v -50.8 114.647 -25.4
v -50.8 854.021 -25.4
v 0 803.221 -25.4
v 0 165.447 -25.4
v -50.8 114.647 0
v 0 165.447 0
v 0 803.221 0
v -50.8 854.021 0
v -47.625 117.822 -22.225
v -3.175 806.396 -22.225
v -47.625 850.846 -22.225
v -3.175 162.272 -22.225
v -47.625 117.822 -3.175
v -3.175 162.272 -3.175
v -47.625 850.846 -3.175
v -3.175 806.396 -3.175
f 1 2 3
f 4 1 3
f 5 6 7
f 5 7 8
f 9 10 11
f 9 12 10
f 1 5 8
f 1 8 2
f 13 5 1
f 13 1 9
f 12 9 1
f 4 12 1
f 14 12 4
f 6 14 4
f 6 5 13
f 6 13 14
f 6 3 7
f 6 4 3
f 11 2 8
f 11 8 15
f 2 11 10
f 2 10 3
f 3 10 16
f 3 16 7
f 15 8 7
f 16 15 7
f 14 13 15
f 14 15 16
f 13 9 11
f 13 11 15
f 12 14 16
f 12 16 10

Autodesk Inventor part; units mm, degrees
ref_plane "YZ Plane" through (0, 0, 0) normal (1, 0, 0) x (0, 1, 0)
ref_plane "XZ Plane" through (0, 0, 0) normal (0, 1, 0) x (-1, 0, 0)
ref_plane "XY Plane" through (0, 0, 0) normal (0, 0, 1) x (1, 0, 0)
sketch "Sketch1" plane through (0, 0, 0) normal (0, 1, 0) x (-1, 0, 0)
  line L0 (0, 0) -> (50.8, 0)
  line L1 (50.8, 0) -> (50.8, -25.4)
  line L2 (50.8, -25.4) -> (0, -25.4)
  line L3 (0, -25.4) -> (0, 0)
  line L4 (47.625, -22.225) -> (47.625, -3.175)
  line L5 (47.625, -3.175) -> (3.175, -3.175)
  line L6 (3.175, -3.175) -> (3.175, -22.225)
  line L7 (3.175, -22.225) -> (47.625, -22.225)
  dimension "d0" = 50.8
  dimension "d1" = 25.4
  dimension "d2" = 3.175
extrude "Extrusion1" add sketch "Sketch1" along normal blind 886.206
sketch "Sketch2" plane through (-50.8, 0, 0) normal (0, 0, 1) x (1, 0, 0)
  line L0 (50.8, 0) -> (0, 0) projected
  line L1 (50.8, 0) -> (50.8, 886.206) projected
  line L2 (0, 886.206) -> (50.8, 886.206) projected
  line L3 (0, 0) -> (0, 886.206) projected
  line L4 (0, 0) -> (50.8, 0) projected
  line L5 (50.8, 0) -> (0, 56.4191)
  line L6 (0, 56.4191) -> (50.8, 56.4191)
  line L7 (50.8, 56.4191) -> (50.8, 0)
  line L8 (50.8, 0) -> (0, 0)
  line L9 (0, 0) -> (0, 56.4191)
  line L10 (0, 56.4191) -> (50.8, 0)
  line L11 (0, 56.4191) -> (21.859, 0)
  line L12 (47.625, 0) -> (3.175, 0) projected
  dimension "d5" = 48
extrude "Extrusion2" cut sketch "Sketch2" against normal blind 914.4 contours L0 L11 L5 | L11 L0 L3
sketch "Sketch3" plane through (-50.8, 886.206, 0) normal (0, 0, 1) x (1, 0, 0)
  line L0 (0, -829.7869) -> (50.8, -886.206) projected
  line L1 (50.8, -886.206) -> (50.8, 0) projected
  line L2 (0, 0) -> (50.8, 0) projected
  line L3 (0, -829.7869) -> (0, 0) projected
  line L4 (0, -829.7869) -> (50.8, -886.206) projected
  line L5 (0, -829.7869) -> (50.8, -778.9869)
  line L6 (50.8, -886.206) -> (50.8, 0) projected
  line L7 (0, -829.7869) -> (0, 0) projected
  line L8 (50.8, -886.206) -> (0, -886.206)
  line L9 (0, -886.206) -> (0, -923.3654)
  line L10 (0, -923.3654) -> (50.8, -923.3654)
  line L11 (50.8, -923.3654) -> (50.8, -886.206)
  dimension "d8" = 93
extrude "Extrusion3" cut sketch "Sketch3" against normal blind 25.4 contours L5 L1 L0
sketch "Sketch4" plane through (-50.8, 886.206, 0) normal (0, 0, 1) x (1, 0, 0)
  line L0 (0, -829.7869) -> (50.8, -778.9869) projected
  line L1 (50.8, -778.9869) -> (50.8, 0) projected
  line L2 (0, 0) -> (50.8, 0) projected
  line L3 (0, -829.7869) -> (0, 0) projected
  line L4 (0, 0) -> (50.8, 0) projected
  line L5 (0, 0) -> (50.8, 0)
  line L6 (50.8, 0) -> (50.8, -221.7928)
  line L7 (50.8, -221.7928) -> (0, -221.7928)
  line L8 (0, -221.7928) -> (0, 0)
  line L9 (0, -829.7869) -> (0, 0) projected
  line L10 (0, 0) -> (50.8, -50.8)
  line L11 (50.8, 0) -> (0, 0)
  line L12 (0, 0) -> (0, -56.4191)
  line L13 (0, -56.4191) -> (50.8, -56.4191)
  line L14 (50.8, -56.4191) -> (50.8, 0)
  point P0 (50.8, -886.206)
  dimension "d11" = 221.7928
  dimension "d12" = 45
  dimension "d13" = 56.4191
extrude "Extrusion4" cut sketch "Sketch4" against normal blind 25.4 contours L2 L1 L10
sketch "Sketch8" plane through (-50.8, 56.4191, 0) normal (0, 0, 1) x (1, 0, 0)
  line L0 (50.8, 778.9869) -> (0, 829.7869) projected
  line L1 (0, 0) -> (0, 829.7869) projected
  line L2 (0, 0) -> (50.8, 50.8) projected
  line L3 (50.8, 50.8) -> (50.8, 778.9869) projected
  line L4 (0, 797.6016) -> (50.8, 746.8016)
  point P0 (50.8, -56.4191)
  dimension "d24" = 22.7584
extrude "Extrusion8" cut sketch "Sketch8" against normal blind 25.4 contours L3 L4 L1 L0
sketch "Sketch9" plane through (-50.8, 56.4191, 0) normal (0, 0, 1) x (1, 0, 0)
  line L0 (50.8, 746.8016) -> (0, 797.6016) projected
  line L1 (0, 0) -> (0, 797.6016) projected
  line L2 (0, 0) -> (50.8, 50.8) projected
  line L3 (50.8, 50.8) -> (50.8, 746.8016) projected
  line L4 (0, 0) -> (0, 797.6016) projected
  line L5 (0, 58.228) -> (50.8, 109.028)
  line L6 (50.8, 50.8) -> (50.8, 746.8016) projected
  line L7 (0, 0) -> (50.8, 50.8) projected
  point P0 (50.8, -56.4191)
  dimension "d27" = 41.1734
extrude "Extrusion9" cut sketch "Sketch9" against normal blind 25.4 contours L3 L2 L1 L5
properties part number "AngleBrace.ver1-1111-2020" material "Aluminum 6061"
